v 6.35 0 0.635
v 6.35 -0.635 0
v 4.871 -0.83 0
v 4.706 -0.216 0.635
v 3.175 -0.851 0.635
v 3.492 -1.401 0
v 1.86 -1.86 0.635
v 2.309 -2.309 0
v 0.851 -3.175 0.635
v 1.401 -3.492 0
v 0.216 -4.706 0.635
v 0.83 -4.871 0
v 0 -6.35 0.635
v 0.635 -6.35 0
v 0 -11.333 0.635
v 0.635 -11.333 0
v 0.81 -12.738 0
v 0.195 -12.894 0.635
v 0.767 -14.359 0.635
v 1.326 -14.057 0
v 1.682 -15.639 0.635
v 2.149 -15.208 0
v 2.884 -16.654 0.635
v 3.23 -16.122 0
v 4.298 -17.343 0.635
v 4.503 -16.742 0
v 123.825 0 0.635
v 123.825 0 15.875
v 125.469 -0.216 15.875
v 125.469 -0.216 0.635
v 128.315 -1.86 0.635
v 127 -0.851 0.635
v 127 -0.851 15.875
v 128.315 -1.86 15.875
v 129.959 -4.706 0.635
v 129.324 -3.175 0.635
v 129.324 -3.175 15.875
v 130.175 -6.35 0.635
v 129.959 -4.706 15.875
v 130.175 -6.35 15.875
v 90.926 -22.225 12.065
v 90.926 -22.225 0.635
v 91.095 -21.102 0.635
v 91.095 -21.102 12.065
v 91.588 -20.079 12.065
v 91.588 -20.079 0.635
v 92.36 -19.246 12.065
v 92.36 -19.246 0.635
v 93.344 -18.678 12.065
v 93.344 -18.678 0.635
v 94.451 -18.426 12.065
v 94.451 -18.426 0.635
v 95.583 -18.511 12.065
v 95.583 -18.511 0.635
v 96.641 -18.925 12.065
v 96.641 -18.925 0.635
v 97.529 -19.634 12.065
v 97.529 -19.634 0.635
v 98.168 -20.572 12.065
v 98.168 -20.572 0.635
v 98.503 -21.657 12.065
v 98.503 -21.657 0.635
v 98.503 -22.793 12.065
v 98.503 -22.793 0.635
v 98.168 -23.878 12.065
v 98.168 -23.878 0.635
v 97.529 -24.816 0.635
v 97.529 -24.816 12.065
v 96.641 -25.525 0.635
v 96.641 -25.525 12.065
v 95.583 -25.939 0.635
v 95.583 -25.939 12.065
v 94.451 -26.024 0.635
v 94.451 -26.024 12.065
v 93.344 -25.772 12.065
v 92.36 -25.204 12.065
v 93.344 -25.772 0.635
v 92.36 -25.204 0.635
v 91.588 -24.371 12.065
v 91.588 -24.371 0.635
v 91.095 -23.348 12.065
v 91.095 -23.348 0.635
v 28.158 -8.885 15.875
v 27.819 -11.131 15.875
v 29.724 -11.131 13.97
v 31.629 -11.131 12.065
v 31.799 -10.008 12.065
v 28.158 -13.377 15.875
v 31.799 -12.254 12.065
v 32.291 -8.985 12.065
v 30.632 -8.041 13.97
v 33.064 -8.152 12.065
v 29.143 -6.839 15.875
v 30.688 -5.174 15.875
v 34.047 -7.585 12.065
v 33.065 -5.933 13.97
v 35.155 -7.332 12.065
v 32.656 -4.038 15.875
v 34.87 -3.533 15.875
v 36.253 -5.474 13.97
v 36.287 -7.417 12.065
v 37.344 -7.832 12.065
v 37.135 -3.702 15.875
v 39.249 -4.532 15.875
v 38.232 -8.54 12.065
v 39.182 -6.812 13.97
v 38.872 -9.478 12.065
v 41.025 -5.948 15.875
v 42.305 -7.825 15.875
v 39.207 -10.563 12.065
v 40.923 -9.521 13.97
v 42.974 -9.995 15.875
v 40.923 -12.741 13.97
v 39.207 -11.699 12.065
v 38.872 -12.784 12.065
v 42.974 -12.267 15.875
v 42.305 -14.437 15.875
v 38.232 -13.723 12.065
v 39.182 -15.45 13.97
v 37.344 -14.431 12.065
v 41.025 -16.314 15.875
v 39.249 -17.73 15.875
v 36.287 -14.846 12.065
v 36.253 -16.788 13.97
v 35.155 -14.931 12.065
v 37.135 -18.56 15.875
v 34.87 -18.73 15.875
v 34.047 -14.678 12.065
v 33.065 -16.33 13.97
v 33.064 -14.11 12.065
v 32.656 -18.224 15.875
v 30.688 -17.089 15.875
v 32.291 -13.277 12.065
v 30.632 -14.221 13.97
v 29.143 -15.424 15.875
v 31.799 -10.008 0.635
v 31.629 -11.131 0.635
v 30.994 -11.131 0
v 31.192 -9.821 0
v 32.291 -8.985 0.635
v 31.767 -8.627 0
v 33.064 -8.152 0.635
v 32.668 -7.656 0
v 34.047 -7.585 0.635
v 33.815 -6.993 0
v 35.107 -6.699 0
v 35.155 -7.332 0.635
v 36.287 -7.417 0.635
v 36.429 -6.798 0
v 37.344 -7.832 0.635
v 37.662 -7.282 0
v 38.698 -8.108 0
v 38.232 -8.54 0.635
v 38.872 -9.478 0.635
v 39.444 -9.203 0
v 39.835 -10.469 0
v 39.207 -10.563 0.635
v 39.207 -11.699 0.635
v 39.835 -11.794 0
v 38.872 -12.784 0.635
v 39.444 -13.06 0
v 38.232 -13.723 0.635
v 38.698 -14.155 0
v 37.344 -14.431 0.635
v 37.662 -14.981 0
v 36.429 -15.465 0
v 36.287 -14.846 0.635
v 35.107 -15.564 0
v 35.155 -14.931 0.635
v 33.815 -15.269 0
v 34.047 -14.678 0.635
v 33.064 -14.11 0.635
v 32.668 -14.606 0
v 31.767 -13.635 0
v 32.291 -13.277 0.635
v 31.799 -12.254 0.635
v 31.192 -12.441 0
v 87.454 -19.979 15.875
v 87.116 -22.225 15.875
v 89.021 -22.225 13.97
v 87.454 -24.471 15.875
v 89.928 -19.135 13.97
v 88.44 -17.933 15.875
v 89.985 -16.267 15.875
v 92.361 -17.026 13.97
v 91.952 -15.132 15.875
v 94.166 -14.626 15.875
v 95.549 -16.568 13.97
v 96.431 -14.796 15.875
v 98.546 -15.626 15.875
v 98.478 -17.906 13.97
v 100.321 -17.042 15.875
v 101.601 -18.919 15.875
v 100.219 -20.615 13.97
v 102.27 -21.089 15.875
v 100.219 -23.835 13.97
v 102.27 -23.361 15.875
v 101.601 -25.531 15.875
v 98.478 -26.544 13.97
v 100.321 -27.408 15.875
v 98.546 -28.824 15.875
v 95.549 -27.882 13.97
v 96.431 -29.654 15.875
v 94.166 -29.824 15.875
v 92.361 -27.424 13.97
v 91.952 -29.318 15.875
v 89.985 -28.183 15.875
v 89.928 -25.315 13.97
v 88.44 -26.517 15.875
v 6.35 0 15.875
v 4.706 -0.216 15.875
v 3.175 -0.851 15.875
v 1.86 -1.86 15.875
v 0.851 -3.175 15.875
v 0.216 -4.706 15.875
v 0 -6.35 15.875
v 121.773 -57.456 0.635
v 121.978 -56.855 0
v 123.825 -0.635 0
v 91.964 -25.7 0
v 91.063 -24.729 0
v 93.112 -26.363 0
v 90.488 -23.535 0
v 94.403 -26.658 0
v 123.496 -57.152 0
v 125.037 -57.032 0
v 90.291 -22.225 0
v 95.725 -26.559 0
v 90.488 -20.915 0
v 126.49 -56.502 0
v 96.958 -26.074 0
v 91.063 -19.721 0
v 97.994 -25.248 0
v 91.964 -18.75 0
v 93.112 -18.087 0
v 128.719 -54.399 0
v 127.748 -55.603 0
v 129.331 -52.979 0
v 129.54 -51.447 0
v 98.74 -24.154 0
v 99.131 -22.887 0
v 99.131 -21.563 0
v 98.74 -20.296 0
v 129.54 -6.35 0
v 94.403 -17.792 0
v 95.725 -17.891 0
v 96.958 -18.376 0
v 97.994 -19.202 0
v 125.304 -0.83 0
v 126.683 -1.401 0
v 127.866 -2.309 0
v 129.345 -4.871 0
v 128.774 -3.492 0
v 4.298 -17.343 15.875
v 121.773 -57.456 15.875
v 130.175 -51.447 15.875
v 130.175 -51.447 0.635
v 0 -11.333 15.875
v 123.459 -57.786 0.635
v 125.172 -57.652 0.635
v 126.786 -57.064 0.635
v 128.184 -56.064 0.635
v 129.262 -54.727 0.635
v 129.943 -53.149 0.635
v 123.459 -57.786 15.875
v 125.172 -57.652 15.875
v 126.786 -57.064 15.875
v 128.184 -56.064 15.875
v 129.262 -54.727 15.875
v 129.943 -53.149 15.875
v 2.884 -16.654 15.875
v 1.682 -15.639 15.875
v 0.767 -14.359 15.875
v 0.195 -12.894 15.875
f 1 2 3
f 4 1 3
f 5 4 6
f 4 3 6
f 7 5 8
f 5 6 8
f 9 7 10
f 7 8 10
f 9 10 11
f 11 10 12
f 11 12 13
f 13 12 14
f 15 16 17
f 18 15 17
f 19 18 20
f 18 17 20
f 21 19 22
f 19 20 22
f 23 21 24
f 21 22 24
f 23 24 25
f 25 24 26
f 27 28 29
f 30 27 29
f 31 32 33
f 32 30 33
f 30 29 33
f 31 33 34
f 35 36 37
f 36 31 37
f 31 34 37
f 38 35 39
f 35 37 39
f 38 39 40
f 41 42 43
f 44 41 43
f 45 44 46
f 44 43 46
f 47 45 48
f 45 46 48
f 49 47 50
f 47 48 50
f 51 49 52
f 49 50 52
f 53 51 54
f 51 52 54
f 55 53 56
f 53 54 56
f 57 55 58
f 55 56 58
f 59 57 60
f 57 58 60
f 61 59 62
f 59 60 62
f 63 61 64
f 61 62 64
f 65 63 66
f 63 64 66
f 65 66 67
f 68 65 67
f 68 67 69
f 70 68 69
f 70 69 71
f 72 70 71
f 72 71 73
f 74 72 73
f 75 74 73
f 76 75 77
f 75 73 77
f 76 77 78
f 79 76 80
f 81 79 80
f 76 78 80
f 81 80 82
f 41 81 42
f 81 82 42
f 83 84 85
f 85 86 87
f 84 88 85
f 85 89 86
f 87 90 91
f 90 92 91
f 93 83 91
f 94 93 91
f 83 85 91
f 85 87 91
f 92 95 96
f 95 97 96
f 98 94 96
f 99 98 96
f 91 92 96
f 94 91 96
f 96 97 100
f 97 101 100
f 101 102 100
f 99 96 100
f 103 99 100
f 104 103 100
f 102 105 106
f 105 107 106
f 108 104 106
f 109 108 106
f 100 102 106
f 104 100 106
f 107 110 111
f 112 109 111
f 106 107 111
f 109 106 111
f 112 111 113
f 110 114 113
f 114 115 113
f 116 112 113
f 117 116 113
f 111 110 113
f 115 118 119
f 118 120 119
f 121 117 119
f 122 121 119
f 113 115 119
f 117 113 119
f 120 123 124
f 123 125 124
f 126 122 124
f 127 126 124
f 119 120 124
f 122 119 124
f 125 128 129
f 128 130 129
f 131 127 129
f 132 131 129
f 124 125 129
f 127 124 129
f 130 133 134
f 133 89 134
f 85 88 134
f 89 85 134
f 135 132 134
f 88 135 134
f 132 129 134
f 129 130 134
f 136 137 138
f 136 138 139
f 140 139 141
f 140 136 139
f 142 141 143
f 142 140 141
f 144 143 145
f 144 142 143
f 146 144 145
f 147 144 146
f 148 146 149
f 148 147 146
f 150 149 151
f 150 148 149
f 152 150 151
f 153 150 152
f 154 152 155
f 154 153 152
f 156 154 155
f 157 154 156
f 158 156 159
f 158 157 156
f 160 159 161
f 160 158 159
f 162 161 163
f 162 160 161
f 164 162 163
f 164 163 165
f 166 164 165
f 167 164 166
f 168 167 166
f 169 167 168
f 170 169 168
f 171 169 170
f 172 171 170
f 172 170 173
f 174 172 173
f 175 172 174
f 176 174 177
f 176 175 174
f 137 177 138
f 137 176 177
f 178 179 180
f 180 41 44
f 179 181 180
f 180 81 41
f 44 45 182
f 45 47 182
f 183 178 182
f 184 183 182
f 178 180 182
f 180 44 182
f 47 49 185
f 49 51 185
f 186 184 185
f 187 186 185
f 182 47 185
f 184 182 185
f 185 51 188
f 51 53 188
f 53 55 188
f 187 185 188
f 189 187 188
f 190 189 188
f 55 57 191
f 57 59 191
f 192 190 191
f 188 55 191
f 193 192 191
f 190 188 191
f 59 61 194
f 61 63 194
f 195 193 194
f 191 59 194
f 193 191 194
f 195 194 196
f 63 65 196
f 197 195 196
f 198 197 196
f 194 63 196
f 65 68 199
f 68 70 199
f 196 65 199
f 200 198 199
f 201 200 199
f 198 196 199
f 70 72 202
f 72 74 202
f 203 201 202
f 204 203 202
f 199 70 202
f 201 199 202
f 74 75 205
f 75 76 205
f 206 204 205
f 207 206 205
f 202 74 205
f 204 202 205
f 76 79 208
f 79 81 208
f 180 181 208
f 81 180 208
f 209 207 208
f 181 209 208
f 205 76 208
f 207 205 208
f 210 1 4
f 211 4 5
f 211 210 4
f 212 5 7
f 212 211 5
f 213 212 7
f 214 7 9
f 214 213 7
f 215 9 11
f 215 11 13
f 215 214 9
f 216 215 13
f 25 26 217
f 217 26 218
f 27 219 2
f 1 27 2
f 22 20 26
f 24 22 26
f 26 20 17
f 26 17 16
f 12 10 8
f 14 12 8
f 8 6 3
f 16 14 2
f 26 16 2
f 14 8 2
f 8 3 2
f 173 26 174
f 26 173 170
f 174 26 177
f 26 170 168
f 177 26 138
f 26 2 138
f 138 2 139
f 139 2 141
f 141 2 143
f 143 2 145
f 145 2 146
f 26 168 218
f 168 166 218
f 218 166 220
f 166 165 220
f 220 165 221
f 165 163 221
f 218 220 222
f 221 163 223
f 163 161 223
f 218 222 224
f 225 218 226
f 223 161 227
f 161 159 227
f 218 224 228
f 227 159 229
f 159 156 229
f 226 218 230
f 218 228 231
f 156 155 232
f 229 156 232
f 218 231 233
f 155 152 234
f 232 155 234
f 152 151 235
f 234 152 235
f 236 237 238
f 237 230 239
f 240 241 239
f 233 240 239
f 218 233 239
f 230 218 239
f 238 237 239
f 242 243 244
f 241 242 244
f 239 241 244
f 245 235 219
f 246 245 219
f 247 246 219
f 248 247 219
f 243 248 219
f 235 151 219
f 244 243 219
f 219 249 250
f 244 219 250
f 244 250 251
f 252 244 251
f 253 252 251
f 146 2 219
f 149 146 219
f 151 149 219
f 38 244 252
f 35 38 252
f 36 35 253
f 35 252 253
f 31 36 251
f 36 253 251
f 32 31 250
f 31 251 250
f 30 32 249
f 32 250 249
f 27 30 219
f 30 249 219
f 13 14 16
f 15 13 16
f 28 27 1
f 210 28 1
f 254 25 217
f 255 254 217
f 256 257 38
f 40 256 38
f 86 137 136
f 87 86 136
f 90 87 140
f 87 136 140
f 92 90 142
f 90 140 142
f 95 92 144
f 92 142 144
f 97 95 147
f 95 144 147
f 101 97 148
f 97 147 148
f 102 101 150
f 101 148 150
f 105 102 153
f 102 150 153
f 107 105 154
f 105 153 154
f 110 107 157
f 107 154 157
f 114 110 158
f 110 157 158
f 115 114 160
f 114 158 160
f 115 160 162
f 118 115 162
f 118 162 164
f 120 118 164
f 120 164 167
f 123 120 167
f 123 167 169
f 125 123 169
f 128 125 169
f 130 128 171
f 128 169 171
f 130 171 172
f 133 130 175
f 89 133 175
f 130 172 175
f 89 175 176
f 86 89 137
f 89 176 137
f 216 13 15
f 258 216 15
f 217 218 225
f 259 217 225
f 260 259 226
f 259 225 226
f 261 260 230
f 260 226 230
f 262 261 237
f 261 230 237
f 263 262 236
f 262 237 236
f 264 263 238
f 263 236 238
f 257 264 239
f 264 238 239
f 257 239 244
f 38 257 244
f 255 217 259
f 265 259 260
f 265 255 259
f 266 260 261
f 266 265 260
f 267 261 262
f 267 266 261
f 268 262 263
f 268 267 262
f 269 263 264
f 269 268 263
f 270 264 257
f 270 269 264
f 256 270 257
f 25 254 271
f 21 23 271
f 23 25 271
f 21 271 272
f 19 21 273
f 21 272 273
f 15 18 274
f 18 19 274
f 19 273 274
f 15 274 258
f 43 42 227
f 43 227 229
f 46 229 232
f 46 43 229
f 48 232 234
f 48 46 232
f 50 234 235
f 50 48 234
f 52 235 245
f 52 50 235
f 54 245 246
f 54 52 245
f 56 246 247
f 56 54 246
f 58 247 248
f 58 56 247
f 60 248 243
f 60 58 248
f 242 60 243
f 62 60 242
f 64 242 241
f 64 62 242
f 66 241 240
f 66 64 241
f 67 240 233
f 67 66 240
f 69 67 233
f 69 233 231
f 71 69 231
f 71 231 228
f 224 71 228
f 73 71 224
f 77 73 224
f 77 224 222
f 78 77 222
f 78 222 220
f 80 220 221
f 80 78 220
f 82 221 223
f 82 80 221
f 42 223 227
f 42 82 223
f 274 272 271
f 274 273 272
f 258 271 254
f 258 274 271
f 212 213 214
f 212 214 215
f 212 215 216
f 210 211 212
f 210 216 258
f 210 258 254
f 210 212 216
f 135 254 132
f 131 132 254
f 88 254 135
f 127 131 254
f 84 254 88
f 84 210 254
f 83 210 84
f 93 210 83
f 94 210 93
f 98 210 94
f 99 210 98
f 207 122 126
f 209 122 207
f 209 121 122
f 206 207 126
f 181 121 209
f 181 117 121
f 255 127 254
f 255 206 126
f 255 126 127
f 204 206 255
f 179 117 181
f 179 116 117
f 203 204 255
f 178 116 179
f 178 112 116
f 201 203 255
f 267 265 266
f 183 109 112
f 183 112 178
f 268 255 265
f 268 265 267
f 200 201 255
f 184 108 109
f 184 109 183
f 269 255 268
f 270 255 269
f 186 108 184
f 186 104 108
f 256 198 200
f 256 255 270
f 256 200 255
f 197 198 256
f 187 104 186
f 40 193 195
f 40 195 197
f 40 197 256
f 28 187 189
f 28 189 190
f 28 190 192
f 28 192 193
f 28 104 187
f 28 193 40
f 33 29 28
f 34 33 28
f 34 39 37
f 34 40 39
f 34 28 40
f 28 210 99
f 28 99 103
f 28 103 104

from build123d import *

# Parameters (mm, degrees)
F1_DEPTH       = 15.875
F3_D           = 7.62
F3_CSINK_D     = 15.24
F3_CSINK_ANGLE = 90
F4_R           = 6.35
F5_SIZE        = 0.635


with BuildPart() as f1:
    # F0 (on Top) → F1 (new body)
    with BuildSketch(Plane.XY):
        Polygon((130.175, 0), (0, 0), (0, -15.875), (130.175, -60.325), align=None)
    extrude(amount=F1_DEPTH)

    # F3 (through all)
    with Locations(Plane.XY.offset(15.875)):
        with Locations((35.439426, -11.131202), (94.735574, -22.225)):
            CounterSinkHole(F3_D / 2, F3_CSINK_D / 2, counter_sink_angle=F3_CSINK_ANGLE)

    # F4
    f4_edges = [f1.edges().sort_by_distance(p)[0] for p in [
        (0, -15.875, 7.9375),
        (0, 0, 7.9375),
        (130.175, -60.325, 7.9375),
        (130.175, 0, 7.9375),
    ]]
    fillet(f4_edges, radius=F4_R)

    # F5
    f5_edges = [f1.edges().sort_by_distance(p)[0] for p in [
        (65.0875, 0, 0),
        (128.315128, -1.859872, 0),
        (1.859872, -1.859872, 0),
        (130.175, -28.898358, 0),
        (0, -8.84165, 0),
        (127.519085, -56.611619, 0),
        (1.185096, -15.027386, 0),
        (63.035537, -37.39933, 0),
        (90.925574, -22.225, 0),
        (31.629426, -11.131202, 0),
    ]]
    chamfer(f5_edges, length=F5_SIZE)


solid = f1.part
